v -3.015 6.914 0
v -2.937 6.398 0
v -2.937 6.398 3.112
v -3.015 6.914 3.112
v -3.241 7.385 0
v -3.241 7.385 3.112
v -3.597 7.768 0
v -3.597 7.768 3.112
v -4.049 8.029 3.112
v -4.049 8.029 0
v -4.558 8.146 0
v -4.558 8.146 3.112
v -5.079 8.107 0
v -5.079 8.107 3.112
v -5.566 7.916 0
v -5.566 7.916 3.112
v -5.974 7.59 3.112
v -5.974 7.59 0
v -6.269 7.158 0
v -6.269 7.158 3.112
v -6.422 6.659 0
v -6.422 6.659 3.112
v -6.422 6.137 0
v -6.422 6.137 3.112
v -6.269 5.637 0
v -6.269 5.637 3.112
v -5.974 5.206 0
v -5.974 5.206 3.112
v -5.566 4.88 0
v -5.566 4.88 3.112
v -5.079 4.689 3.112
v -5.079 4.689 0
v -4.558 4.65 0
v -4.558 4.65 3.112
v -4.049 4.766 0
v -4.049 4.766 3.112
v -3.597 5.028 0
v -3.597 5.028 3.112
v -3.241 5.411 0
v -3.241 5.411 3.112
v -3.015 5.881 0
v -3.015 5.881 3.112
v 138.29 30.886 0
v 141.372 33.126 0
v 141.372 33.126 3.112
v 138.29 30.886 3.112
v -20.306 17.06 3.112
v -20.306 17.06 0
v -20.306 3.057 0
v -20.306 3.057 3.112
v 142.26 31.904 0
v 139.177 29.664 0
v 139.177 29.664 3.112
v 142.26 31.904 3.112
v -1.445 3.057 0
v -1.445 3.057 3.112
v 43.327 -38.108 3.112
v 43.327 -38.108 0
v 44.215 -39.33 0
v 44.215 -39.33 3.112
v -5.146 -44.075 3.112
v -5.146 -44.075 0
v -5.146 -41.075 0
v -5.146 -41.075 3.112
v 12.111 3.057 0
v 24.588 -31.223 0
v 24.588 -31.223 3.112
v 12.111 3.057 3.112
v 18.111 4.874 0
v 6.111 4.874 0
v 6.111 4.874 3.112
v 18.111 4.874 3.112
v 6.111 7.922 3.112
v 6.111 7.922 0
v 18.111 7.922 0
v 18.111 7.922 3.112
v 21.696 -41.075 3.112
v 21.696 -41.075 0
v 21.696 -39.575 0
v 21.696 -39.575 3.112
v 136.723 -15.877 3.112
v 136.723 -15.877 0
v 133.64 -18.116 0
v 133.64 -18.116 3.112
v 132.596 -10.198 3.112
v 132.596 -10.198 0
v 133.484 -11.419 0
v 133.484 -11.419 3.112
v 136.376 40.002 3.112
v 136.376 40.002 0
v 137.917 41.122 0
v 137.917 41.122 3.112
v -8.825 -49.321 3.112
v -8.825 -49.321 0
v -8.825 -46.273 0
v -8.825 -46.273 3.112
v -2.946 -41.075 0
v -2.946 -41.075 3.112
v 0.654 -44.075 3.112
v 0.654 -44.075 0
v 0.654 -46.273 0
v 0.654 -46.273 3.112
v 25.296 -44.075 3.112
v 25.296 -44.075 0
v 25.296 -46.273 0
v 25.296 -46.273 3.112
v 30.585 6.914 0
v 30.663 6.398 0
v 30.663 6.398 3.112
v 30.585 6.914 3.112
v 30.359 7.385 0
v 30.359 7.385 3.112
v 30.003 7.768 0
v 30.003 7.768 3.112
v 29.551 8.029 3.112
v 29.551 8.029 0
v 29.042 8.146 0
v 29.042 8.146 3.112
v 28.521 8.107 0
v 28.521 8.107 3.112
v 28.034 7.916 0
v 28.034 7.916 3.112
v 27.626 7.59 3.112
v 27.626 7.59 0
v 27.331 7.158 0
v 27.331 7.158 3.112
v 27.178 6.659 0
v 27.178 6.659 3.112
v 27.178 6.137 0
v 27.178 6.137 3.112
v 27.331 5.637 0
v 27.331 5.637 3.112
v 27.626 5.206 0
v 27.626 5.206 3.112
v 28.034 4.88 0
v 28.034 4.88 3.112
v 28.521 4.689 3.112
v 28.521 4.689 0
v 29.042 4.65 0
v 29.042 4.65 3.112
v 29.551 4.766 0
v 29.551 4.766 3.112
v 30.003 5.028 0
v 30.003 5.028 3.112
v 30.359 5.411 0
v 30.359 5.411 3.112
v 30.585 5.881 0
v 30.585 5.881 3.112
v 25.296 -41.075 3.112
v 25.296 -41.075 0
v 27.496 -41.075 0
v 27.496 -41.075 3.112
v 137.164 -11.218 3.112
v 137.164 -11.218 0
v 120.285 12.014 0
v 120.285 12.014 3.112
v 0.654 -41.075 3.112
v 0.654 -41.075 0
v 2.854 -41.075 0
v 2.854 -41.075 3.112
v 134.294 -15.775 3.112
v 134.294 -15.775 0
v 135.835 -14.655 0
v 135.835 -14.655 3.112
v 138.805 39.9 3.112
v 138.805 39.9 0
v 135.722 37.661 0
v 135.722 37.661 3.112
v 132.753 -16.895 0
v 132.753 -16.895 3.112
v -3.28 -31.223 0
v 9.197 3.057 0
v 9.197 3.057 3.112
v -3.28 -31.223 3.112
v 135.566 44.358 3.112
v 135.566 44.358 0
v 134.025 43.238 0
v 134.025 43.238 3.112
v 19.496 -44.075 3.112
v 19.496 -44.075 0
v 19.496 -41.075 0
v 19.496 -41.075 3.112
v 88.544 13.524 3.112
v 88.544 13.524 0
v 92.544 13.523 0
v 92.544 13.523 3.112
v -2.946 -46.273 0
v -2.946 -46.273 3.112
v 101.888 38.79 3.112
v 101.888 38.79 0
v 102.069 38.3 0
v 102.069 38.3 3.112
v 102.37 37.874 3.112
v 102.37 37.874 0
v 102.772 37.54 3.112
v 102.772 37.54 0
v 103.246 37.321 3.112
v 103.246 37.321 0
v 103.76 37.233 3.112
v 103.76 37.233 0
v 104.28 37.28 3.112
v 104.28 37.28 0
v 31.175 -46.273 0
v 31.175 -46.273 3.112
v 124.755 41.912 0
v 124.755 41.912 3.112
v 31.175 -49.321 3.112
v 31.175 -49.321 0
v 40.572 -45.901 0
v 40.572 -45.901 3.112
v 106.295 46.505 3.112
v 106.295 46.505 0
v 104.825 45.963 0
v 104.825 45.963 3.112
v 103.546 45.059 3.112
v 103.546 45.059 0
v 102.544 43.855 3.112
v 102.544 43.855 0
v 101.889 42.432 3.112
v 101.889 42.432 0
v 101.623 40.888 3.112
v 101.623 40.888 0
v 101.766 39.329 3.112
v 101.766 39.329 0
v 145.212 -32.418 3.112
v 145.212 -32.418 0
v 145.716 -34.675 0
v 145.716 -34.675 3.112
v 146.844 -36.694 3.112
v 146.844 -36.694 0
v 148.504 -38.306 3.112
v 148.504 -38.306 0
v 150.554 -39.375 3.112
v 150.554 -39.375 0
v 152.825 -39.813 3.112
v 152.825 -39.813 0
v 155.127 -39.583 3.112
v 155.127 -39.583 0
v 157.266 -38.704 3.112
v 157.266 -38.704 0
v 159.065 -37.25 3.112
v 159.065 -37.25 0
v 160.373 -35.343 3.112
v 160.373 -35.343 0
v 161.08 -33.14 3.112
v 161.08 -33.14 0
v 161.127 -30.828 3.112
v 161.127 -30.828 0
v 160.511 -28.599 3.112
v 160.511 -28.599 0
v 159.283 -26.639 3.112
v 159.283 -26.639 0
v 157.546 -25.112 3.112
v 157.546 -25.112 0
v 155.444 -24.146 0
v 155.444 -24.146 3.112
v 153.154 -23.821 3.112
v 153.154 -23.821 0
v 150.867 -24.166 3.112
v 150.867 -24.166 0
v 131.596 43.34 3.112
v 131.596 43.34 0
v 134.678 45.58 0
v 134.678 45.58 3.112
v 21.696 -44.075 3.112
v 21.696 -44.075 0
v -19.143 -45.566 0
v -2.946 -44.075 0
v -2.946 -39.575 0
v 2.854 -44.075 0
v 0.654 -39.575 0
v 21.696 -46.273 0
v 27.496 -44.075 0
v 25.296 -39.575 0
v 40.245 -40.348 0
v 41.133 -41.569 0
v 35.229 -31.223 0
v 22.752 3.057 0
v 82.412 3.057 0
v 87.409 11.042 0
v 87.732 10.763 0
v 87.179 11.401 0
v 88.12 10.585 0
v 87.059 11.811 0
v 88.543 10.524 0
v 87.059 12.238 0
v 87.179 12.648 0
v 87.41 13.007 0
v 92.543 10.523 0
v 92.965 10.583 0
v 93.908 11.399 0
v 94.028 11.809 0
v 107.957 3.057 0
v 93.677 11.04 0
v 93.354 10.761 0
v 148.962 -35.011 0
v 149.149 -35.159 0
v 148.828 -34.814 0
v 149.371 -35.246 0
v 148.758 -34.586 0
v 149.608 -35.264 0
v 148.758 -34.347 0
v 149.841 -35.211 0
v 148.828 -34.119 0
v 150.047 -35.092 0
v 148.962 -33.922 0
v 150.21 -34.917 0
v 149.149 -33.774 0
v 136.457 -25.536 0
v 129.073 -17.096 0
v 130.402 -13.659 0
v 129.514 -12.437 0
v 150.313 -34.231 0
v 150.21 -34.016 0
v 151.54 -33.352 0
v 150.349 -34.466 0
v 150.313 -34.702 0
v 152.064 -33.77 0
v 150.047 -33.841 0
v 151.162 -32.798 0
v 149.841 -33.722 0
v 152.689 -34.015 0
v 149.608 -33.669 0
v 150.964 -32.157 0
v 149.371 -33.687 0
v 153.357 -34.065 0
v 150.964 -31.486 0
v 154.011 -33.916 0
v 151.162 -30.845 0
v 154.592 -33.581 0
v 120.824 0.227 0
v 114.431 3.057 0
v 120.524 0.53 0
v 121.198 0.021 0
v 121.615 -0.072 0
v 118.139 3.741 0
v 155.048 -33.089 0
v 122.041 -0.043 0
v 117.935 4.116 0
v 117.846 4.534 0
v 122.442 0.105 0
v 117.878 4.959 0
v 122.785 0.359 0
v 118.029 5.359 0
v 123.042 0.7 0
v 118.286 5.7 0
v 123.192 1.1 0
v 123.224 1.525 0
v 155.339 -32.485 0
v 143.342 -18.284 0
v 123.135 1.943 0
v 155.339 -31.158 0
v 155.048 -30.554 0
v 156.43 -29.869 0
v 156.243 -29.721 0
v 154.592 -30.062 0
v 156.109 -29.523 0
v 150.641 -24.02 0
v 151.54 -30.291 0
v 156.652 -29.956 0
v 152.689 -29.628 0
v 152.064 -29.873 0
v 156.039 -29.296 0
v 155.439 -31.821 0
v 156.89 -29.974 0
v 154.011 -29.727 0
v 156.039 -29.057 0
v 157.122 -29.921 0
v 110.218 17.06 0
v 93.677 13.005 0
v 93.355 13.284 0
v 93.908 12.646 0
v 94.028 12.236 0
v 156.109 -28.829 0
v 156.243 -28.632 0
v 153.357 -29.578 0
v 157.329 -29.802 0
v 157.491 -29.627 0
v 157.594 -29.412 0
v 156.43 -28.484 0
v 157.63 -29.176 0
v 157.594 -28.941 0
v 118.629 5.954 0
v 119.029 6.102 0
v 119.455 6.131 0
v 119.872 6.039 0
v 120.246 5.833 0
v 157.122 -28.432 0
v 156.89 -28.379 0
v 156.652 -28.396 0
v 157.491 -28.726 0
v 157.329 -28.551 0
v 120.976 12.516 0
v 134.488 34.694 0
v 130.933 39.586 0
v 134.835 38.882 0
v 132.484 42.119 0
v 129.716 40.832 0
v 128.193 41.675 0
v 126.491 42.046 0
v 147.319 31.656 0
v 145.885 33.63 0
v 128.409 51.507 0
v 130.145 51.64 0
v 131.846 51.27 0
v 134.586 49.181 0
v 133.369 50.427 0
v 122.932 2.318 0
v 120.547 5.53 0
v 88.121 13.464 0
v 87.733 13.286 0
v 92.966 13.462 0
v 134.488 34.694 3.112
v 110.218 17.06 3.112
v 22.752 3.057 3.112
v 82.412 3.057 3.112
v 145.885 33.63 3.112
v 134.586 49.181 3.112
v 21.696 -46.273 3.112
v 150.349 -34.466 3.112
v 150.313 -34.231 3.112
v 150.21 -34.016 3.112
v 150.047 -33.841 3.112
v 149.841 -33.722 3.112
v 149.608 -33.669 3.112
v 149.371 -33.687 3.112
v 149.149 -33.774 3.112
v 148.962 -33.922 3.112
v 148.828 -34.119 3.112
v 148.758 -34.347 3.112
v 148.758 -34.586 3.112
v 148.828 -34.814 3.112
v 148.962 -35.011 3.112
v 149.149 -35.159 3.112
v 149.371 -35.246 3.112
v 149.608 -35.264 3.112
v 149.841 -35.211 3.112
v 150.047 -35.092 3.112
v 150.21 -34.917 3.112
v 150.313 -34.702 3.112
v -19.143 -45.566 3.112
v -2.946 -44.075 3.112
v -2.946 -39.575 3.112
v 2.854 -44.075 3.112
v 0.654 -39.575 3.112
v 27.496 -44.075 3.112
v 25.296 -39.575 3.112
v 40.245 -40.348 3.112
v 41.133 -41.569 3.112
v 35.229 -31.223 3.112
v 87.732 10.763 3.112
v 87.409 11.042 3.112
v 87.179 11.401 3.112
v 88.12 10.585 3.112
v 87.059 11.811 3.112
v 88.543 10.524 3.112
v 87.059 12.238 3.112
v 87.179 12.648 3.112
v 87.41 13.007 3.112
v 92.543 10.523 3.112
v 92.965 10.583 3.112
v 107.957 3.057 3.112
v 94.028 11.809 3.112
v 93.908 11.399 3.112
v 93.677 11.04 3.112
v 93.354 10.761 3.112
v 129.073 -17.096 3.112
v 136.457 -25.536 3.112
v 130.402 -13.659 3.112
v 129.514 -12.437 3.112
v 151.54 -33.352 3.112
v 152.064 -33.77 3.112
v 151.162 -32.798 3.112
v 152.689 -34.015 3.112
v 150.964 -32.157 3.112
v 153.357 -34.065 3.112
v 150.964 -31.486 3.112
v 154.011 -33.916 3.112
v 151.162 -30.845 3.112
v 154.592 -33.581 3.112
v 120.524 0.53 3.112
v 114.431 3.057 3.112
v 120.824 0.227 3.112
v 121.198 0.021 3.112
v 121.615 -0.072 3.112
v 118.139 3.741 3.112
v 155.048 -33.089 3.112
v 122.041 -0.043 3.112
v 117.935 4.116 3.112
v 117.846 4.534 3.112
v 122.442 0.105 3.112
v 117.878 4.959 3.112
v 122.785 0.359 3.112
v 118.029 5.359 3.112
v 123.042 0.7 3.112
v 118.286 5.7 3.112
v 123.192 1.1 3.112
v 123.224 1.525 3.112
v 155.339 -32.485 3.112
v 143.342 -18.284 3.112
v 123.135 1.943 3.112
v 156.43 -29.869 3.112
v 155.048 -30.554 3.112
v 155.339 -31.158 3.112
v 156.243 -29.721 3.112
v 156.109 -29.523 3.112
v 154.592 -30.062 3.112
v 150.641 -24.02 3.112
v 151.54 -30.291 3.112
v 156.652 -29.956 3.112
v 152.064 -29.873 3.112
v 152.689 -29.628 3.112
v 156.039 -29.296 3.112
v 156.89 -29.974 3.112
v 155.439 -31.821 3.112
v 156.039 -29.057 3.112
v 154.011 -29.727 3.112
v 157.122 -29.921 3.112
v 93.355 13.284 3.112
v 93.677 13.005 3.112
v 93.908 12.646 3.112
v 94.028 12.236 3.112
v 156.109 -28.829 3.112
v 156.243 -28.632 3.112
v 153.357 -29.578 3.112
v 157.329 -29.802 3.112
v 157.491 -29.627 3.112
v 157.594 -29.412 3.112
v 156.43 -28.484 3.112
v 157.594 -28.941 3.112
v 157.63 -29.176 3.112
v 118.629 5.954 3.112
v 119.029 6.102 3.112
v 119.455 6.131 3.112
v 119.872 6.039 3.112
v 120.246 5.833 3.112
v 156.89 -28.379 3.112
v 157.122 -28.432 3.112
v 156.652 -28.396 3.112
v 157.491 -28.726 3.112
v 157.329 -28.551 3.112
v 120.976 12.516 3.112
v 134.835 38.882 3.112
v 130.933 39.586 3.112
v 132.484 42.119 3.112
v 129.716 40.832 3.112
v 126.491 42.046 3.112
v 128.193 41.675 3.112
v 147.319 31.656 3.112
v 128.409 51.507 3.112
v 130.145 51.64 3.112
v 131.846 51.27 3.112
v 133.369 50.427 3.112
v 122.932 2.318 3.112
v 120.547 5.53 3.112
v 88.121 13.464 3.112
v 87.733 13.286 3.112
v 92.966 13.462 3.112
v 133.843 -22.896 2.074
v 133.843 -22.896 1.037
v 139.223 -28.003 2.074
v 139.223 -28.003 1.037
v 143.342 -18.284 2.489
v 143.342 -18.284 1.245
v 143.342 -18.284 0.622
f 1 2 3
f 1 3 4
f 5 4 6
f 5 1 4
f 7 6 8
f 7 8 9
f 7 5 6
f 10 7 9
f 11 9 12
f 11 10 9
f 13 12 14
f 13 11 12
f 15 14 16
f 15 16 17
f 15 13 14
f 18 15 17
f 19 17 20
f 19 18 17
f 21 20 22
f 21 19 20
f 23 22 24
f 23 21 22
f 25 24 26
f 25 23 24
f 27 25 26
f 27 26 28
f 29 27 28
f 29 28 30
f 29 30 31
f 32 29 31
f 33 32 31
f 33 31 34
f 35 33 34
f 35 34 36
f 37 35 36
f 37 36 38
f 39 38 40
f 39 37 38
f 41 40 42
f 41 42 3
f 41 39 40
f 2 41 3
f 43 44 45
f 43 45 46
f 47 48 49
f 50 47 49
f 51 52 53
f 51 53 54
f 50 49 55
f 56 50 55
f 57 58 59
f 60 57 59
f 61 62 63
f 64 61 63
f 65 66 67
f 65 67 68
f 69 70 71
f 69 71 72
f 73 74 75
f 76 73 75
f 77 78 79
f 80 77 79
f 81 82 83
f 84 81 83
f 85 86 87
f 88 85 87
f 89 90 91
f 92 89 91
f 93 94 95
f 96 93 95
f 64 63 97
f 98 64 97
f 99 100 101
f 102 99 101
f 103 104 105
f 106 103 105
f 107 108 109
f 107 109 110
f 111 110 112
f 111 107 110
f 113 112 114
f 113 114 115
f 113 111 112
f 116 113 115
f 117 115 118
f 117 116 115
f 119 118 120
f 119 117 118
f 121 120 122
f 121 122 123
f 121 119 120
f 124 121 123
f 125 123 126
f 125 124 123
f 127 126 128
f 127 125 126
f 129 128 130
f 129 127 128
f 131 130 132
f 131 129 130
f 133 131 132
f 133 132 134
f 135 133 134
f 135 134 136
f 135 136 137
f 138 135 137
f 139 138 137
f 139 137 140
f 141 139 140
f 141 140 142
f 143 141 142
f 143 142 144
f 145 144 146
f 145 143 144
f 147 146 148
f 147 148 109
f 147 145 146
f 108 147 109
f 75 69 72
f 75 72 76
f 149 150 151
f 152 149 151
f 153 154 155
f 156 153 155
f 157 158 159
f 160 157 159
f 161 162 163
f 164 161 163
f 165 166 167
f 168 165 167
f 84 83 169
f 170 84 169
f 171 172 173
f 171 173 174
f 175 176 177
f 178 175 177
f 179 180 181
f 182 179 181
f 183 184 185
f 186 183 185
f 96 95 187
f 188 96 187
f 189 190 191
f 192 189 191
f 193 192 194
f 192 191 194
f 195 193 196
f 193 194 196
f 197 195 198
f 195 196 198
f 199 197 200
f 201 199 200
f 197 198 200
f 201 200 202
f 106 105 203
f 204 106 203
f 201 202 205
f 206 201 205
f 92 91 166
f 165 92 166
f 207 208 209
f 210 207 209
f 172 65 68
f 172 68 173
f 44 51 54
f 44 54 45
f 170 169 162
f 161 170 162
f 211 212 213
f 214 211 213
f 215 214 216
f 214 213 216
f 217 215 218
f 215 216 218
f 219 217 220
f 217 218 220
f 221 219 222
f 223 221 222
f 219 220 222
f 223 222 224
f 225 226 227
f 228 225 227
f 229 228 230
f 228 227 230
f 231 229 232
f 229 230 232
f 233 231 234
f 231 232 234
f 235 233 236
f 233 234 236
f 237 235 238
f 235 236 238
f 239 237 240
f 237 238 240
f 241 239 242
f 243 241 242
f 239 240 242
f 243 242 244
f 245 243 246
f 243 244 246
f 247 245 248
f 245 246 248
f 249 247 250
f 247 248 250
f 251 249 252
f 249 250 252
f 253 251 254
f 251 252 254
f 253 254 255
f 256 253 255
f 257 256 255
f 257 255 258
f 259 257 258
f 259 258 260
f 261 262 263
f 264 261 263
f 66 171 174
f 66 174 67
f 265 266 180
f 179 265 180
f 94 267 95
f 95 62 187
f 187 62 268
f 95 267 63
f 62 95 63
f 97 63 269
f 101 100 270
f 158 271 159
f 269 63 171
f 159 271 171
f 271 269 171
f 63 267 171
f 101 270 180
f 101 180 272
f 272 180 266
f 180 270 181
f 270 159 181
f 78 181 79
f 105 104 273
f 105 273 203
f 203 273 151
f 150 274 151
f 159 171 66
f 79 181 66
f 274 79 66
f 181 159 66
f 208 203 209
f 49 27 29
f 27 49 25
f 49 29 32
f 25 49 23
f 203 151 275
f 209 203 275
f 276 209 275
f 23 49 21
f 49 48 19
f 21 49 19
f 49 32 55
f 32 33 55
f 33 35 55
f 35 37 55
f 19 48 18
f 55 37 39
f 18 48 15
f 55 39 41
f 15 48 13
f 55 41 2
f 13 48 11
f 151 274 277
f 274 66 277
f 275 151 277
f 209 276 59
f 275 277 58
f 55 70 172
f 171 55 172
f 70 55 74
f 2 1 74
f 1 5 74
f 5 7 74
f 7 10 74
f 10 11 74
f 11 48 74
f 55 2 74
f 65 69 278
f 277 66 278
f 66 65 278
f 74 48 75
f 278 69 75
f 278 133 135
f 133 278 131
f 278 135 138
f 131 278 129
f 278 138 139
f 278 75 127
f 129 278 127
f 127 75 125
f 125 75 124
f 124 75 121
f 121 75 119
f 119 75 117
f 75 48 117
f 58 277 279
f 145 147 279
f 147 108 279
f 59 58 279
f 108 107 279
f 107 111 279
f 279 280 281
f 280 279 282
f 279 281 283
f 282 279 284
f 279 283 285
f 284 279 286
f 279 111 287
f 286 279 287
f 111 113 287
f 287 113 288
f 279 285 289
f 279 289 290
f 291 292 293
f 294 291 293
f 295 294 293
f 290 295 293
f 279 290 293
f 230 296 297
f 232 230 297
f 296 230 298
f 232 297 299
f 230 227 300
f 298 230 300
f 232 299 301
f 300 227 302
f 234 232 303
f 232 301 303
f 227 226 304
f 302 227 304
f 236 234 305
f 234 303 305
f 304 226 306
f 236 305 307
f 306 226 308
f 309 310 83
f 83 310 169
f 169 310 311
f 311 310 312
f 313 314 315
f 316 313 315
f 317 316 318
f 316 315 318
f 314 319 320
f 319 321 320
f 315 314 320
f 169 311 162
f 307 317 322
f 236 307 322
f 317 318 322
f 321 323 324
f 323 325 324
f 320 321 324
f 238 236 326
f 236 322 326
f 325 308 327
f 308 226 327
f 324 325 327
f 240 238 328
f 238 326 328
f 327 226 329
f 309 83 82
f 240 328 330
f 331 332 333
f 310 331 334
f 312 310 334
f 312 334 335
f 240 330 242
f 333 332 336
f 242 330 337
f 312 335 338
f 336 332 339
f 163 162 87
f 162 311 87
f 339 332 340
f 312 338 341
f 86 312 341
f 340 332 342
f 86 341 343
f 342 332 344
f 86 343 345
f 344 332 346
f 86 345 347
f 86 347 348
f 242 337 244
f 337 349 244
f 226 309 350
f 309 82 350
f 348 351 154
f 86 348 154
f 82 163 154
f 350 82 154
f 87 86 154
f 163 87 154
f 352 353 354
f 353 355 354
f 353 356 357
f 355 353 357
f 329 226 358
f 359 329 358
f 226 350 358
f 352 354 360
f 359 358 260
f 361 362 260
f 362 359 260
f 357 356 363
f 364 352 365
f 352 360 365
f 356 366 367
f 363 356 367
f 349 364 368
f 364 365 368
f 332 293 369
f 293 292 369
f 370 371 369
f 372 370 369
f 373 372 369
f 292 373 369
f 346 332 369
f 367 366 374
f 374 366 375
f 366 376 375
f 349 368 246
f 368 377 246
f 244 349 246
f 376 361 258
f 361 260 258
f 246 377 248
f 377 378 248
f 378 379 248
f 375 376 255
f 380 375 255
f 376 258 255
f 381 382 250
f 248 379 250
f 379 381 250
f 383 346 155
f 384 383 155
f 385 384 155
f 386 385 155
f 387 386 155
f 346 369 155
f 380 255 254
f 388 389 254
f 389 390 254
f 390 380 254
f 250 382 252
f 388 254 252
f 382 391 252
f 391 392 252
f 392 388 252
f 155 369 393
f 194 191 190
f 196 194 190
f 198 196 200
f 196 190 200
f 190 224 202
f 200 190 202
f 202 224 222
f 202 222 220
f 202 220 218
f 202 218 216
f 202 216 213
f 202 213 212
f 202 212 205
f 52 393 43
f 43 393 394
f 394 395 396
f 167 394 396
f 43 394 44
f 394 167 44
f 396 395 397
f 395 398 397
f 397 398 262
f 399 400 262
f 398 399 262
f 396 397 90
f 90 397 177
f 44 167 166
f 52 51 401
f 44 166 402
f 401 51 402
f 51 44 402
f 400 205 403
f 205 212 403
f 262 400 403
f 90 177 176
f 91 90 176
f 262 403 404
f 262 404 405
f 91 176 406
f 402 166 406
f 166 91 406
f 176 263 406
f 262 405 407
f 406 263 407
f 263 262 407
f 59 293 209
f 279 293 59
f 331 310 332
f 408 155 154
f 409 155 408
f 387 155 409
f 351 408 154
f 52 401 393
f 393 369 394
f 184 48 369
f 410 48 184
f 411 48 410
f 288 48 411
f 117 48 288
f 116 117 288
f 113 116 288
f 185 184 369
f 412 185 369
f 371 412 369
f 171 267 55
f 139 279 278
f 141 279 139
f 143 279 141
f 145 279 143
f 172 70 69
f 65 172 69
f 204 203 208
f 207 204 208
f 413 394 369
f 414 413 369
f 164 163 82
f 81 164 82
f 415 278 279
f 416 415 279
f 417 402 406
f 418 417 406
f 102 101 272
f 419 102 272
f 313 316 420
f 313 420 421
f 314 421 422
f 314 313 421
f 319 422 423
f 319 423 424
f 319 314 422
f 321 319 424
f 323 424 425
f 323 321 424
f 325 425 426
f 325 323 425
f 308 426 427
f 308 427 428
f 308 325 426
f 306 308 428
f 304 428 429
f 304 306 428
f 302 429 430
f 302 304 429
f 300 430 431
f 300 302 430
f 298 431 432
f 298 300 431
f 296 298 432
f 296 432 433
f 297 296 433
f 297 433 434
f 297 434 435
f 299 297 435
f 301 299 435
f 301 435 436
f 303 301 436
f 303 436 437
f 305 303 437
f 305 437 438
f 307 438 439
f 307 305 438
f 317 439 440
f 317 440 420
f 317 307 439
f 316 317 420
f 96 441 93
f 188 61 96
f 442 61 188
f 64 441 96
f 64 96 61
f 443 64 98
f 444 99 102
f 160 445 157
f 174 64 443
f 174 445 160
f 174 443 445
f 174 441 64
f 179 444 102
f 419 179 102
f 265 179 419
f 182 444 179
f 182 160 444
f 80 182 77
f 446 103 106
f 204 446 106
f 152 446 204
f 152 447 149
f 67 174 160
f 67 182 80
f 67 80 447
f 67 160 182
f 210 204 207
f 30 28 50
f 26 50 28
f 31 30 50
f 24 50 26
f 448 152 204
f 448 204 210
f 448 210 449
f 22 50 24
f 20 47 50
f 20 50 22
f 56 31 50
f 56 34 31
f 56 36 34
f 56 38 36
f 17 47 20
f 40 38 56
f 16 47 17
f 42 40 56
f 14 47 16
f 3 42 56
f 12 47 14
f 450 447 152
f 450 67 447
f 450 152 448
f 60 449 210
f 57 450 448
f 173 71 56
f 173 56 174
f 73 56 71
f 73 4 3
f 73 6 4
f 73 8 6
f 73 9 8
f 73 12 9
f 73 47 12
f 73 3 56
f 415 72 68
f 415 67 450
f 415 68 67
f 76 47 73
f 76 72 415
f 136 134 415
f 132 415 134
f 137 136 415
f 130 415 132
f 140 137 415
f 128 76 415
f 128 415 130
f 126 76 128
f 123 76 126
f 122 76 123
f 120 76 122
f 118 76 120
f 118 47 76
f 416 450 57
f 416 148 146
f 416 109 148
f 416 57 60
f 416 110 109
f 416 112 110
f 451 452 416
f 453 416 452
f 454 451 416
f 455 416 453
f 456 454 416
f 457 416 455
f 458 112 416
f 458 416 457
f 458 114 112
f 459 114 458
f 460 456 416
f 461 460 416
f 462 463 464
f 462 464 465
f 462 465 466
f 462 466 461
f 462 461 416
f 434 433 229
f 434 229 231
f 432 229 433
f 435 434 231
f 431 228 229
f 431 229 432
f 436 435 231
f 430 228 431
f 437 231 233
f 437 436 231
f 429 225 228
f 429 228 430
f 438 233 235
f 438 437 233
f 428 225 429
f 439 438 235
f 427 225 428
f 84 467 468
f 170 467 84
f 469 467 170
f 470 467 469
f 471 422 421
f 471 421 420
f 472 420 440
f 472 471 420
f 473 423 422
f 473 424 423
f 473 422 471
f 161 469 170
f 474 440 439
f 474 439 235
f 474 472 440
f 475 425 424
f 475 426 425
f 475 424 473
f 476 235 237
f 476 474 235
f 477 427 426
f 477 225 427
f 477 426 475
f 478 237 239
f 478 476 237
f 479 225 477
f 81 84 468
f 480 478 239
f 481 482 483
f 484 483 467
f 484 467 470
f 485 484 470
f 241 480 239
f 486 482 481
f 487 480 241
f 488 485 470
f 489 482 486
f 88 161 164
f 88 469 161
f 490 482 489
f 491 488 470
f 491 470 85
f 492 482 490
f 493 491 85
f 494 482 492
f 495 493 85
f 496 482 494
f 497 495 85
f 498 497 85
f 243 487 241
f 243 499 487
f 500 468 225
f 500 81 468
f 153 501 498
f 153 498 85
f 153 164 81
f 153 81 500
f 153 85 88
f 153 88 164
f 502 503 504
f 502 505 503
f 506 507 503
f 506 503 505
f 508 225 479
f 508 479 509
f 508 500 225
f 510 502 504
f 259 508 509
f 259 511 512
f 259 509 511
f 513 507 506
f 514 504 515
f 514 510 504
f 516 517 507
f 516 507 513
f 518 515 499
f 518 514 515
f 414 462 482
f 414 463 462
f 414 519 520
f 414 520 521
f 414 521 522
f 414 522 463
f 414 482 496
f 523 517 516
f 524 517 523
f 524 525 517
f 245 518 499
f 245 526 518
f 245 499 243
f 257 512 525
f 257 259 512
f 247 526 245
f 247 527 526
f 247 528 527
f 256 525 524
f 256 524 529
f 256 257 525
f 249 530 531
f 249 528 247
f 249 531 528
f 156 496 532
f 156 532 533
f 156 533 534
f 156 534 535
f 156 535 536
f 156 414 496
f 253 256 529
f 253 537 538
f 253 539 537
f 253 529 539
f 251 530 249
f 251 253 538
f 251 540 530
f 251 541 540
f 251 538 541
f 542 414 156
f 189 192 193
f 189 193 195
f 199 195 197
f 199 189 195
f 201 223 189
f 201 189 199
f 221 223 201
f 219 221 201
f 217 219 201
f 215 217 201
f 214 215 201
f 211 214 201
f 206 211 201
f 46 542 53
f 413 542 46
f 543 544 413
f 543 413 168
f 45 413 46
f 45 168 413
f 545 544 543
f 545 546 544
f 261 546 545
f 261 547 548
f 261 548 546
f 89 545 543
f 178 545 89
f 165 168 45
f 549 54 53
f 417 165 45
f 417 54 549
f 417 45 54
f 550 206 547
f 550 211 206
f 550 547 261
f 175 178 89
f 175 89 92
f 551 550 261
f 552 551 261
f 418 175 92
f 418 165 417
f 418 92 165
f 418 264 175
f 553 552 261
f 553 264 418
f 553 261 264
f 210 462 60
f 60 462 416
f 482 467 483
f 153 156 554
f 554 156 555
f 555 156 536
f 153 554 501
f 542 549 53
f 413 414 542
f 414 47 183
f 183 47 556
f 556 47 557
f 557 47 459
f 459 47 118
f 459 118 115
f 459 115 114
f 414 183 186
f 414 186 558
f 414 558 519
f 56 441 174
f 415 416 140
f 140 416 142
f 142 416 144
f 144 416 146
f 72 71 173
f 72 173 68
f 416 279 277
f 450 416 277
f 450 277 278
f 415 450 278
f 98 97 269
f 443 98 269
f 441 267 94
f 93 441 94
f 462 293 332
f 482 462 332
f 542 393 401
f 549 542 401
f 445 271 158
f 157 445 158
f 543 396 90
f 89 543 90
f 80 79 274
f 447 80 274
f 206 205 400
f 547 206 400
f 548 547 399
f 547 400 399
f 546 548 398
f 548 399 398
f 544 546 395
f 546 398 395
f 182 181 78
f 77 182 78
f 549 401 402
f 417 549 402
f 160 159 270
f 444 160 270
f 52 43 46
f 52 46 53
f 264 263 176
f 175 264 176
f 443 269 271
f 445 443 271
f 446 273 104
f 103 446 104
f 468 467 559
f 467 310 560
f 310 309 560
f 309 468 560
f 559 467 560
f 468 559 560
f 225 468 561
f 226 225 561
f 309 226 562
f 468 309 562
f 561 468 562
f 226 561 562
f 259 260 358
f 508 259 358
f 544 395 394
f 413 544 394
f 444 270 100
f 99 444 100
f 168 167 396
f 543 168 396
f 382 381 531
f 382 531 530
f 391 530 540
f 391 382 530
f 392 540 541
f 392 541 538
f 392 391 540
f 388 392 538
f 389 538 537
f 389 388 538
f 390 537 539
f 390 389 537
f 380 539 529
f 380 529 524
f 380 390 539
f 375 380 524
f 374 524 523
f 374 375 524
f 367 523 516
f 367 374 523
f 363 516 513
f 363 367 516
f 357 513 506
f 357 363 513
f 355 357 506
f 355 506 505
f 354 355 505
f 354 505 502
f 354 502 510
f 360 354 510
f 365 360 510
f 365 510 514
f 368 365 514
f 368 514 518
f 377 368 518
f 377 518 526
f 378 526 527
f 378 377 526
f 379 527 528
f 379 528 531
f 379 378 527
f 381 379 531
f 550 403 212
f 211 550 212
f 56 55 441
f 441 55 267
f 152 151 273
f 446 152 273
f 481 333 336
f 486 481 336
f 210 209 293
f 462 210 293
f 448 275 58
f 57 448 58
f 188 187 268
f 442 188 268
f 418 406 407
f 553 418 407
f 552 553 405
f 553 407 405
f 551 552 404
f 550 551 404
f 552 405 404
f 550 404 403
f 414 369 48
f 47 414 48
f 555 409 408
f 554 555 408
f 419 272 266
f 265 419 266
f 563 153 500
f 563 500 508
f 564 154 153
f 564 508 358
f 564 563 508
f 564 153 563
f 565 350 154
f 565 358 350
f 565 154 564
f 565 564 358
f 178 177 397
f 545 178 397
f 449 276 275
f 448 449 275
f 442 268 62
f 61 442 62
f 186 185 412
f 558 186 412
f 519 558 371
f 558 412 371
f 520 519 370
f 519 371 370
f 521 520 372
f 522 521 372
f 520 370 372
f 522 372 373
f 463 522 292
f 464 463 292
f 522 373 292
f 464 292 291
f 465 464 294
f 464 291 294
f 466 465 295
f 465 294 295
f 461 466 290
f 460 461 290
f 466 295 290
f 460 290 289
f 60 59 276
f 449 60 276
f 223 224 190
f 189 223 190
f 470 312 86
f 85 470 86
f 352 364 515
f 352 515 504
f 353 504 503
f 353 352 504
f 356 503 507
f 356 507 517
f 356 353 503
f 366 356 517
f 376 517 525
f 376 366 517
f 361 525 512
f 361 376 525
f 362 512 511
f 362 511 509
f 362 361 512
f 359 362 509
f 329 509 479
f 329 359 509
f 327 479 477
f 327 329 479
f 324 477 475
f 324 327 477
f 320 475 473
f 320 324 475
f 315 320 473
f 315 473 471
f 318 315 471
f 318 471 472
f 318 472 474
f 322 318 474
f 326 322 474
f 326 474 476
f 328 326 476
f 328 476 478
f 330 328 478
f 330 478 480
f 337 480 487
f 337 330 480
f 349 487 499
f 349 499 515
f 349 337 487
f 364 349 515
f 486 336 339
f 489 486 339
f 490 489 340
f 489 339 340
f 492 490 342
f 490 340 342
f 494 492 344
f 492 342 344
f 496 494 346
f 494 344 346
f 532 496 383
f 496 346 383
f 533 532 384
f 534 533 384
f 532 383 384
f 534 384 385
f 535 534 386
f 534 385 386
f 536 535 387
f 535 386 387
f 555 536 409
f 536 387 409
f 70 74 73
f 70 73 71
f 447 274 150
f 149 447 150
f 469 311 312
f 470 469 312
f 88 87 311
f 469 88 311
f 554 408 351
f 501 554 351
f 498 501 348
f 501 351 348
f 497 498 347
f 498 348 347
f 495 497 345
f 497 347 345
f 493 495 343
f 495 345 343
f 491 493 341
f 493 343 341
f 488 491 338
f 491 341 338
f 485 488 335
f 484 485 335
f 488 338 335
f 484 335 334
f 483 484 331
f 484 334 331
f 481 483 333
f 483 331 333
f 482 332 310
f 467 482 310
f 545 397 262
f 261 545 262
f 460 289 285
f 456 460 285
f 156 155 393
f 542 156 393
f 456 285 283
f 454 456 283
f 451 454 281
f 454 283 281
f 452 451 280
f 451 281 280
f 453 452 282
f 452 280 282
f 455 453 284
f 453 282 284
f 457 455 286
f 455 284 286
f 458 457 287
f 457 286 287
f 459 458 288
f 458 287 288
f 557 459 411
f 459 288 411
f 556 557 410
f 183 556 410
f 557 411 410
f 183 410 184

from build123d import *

# Parameters (mm, degrees)
SKETCH1_R           = 2.25
SKETCH1_R_2         = 0.8
SKETCH1_R_3         = 1.7526
BOSS_EXTRUDE1_DEPTH = 3.1115


with BuildPart() as part:
    # Sketch1 → Boss-Extrude1 (new body)
    with BuildSketch(Plane.XY):
        with BuildLine():
            Line((40.571674968, -45.901211355), (107.95698504, 3.057082175))
            Line((107.95698504, 3.057082175), (114.431306158, 3.057082175))
            Line((114.431306158, 3.057082175), (129.0733448, -17.095955091))
            add(Edge.make_bspline(
                [(129.0733448, -17.095955091), (133.53865967, -23.241933746), (138.918061624, -28.349297229), (145.211550663, -32.41804554)],
                knots=[0.5, 0.5, 0.5, 0.5, 0.915854192, 0.915854192, 0.915854192, 0.915854192], degree=3))
            ThreePointArc((145.211550663, -32.41804554), (159.788231987, -36.343991717), (150.867180903, -24.165833426))
            Line((150.867180903, -24.165833426), (150.640762289, -24.020208846))
            add(Edge.make_bspline(
                [(137.163514743, -11.218102568), (137.631181225, -11.861790257), (138.599969423, -13.134624479), (140.611611711, -15.54248749), (143.29771775, -18.340403293), (146.787953317, -21.358895338), (149.334712498, -23.17584607), (150.640762289, -24.020208846)],
                knots=[0.5, 0.5, 0.5, 0.5, 0.551981774, 0.603963548, 0.707927096, 0.811890644, 0.915854192, 0.915854192, 0.915854192, 0.915854192], degree=3))
            Line((137.163514743, -11.218102568), (120.284653169, 12.013657342))
            Line((120.284653169, 12.013657342), (120.976190903, 12.516088915))
            Line((120.976190903, 12.516088915), (147.319477841, 31.655607203))
            Line((147.319477841, 31.655607203), (145.885321673, 33.629553824))
            Line((145.885321673, 33.629553824), (134.586350681, 49.181253217))
            ThreePointArc((134.586350681, 49.181253217), (131.845960487, 51.269897662), (128.408504904, 51.506695351))
            Line((128.408504904, 51.506695351), (106.294747249, 46.504613793))
            ThreePointArc((106.294747249, 46.504613793), (102.544365306, 43.854529448), (101.766337412, 39.328716333))
            Line((101.766337412, 39.328716333), (101.888205656, 38.789947666))
            ThreePointArc((101.888205656, 38.789947666), (102.771567105, 37.539820352), (104.280171476, 37.280477721))
            Line((104.280171476, 37.280477721), (124.755382254, 41.911923712))
            ThreePointArc((124.755382254, 41.911923712), (128.192837837, 41.675126022), (130.933228031, 39.586481577))
            Line((130.933228031, 39.586481577), (134.488040457, 34.693702023))
            Line((134.488040457, 34.693702023), (110.217530626, 17.060144455))
            Line((110.217530626, 17.060144455), (34.693822445, 17.060144455))
            Line((34.693822445, 17.060144455), (-20.306177555, 17.060144455))
            Line((-20.306177555, 17.060144455), (-20.306177555, 7.060144459))
            Line((-20.306177555, 7.060144459), (-20.306177555, 3.057082175))
            Line((-20.306177555, 3.057082175), (-1.445233082, 3.057082175))
            Line((-1.445233082, 3.057082175), (-19.142654999, -45.566184926))
            Line((-19.142654999, -45.566184926), (-8.82525124, -49.321412789))
            Line((-8.82525124, -49.321412789), (-8.82525124, -46.273412789))
            Line((-8.82525124, -46.273412789), (-2.94645984, -46.273412789))
            Line((-2.94645984, -46.273412789), (-2.94645984, -44.075412789))
            Line((-2.94645984, -44.075412789), (-5.14645984, -44.075412789))
            Line((-5.14645984, -44.075412789), (-5.14645984, -41.075412789))
            Line((-5.14645984, -41.075412789), (-2.94645984, -41.075412789))
            Line((-2.94645984, -41.075412789), (-2.94645984, -39.575412789))
            Line((-2.94645984, -39.575412789), (0.65354016, -39.575412789))
            Line((0.65354016, -39.575412789), (0.65354016, -41.075412789))
            Line((0.65354016, -41.075412789), (2.85354016, -41.075412789))
            Line((2.85354016, -41.075412789), (2.85354016, -44.075412789))
            Line((2.85354016, -44.075412789), (0.65354016, -44.075412789))
            Line((0.65354016, -44.075412789), (0.65354016, -46.273412789))
            Line((0.65354016, -46.273412789), (21.695957359, -46.273412789))
            Line((21.695957359, -46.273412789), (21.695957359, -44.075412789))
            Line((21.695957359, -44.075412789), (19.495957359, -44.075412789))
            Line((19.495957359, -44.075412789), (19.495957359, -41.075412789))
            Line((19.495957359, -41.075412789), (21.695957359, -41.075412789))
            Line((21.695957359, -41.075412789), (21.695957359, -39.575412789))
            Line((21.695957359, -39.575412789), (25.295957359, -39.575412789))
            Line((25.295957359, -39.575412789), (25.295957359, -41.075412789))
            Line((25.295957359, -41.075412789), (27.495957359, -41.075412789))
            Line((27.495957359, -41.075412789), (27.495957359, -44.075412789))
            Line((27.495957359, -44.075412789), (25.295957359, -44.075412789))
            Line((25.295957359, -44.075412789), (25.295957359, -46.273412789))
            Line((25.295957359, -46.273412789), (31.17474876, -46.273412789))
            Line((31.17474876, -46.273412789), (31.17474876, -49.321412789))
            Line((31.17474876, -49.321412789), (40.571674968, -45.901211355))
        make_face()
        with Locations((153.189271476, -31.821412789)):
            Circle(SKETCH1_R, mode=Mode.SUBTRACT)
        with Locations((156.829847951, -29.176379153)):
            Circle(SKETCH1_R_2, mode=Mode.SUBTRACT)
        with Locations((149.548695001, -34.466446424)):
            Circle(SKETCH1_R_2, mode=Mode.SUBTRACT)
        with Locations((-4.689464322, 6.397861115)):
            Circle(SKETCH1_R_3, mode=Mode.SUBTRACT)
        with Locations((28.910535678, 6.397861115)):
            Circle(SKETCH1_R_3, mode=Mode.SUBTRACT)
        Polygon((22.752313402, 3.057082175), (82.411954897, 3.057082175), (35.229290336, -31.223130213), align=None, mode=Mode.SUBTRACT)
        Polygon((24.587512611, -31.223130213), (12.110535678, 3.057082175), (9.196544643, 3.057082175), (-3.28043229, -31.223130213), align=None, mode=Mode.SUBTRACT)
        with BuildLine():
            Line((88.543835939, 13.524152696), (92.543835721, 13.522830074))
            ThreePointArc((92.543835721, 13.522830074), (94.043339655, 12.022334173), (92.542843754, 10.522830238))
            Line((92.542843754, 10.522830238), (88.542843973, 10.52415286))
            ThreePointArc((88.542843973, 10.52415286), (87.043340038, 12.024648761), (88.543835939, 13.524152696))
        make_face(mode=Mode.SUBTRACT)
        with BuildLine():
            Line((120.546853002, 5.529529102), (122.932016073, 2.318454963))
            ThreePointArc((122.932016073, 2.318454963), (122.622299423, 0.21986601), (120.523710469, 0.52958266))
            Line((120.523710469, 0.52958266), (118.138547398, 3.740656799))
            ThreePointArc((118.138547398, 3.740656799), (118.448264049, 5.839245752), (120.546853002, 5.529529102))
        make_face(mode=Mode.SUBTRACT)
        Polygon((131.942859267, -12.538994841), (130.401681893, -13.658725747), (129.514126162, -12.437110085), (132.59648091, -10.197648274), (133.484036641, -11.419263935), align=None, mode=Mode.SUBTRACT)
        Polygon((134.294000276, -15.775062818), (135.835177651, -14.655331913), (136.722733382, -15.876947574), (133.640378633, -18.116409385), (132.752822902, -16.894793724), align=None, mode=Mode.SUBTRACT)
        Polygon((138.289721592, 30.886083745), (139.177277323, 29.664468084), (142.259632072, 31.903929895), (141.372076341, 33.125545557), align=None, mode=Mode.SUBTRACT)
        Polygon((40.244952044, -40.34761098), (43.327306792, -38.108149169), (44.214862523, -39.32976483), (41.132507775, -41.569226641), align=None, mode=Mode.SUBTRACT)
        Polygon((134.024760687, 43.238257986), (132.483583313, 42.118527081), (131.596027582, 43.340142742), (134.67838233, 45.579604554), (135.565938061, 44.357988892), align=None, mode=Mode.SUBTRACT)
        Polygon((136.375901696, 40.002190009), (137.917079071, 41.121920915), (138.804634802, 39.900305253), (135.722280053, 37.660843442), (134.834724322, 38.882459103), align=None, mode=Mode.SUBTRACT)
        Polygon((6.110535678, 4.873861115), (18.110535678, 4.873861115), (18.110535678, 7.921861115), (12.110535678, 7.921861115), (6.110535678, 7.921861115), align=None, mode=Mode.SUBTRACT)
    extrude(amount=BOSS_EXTRUDE1_DEPTH)


solid = part.part
